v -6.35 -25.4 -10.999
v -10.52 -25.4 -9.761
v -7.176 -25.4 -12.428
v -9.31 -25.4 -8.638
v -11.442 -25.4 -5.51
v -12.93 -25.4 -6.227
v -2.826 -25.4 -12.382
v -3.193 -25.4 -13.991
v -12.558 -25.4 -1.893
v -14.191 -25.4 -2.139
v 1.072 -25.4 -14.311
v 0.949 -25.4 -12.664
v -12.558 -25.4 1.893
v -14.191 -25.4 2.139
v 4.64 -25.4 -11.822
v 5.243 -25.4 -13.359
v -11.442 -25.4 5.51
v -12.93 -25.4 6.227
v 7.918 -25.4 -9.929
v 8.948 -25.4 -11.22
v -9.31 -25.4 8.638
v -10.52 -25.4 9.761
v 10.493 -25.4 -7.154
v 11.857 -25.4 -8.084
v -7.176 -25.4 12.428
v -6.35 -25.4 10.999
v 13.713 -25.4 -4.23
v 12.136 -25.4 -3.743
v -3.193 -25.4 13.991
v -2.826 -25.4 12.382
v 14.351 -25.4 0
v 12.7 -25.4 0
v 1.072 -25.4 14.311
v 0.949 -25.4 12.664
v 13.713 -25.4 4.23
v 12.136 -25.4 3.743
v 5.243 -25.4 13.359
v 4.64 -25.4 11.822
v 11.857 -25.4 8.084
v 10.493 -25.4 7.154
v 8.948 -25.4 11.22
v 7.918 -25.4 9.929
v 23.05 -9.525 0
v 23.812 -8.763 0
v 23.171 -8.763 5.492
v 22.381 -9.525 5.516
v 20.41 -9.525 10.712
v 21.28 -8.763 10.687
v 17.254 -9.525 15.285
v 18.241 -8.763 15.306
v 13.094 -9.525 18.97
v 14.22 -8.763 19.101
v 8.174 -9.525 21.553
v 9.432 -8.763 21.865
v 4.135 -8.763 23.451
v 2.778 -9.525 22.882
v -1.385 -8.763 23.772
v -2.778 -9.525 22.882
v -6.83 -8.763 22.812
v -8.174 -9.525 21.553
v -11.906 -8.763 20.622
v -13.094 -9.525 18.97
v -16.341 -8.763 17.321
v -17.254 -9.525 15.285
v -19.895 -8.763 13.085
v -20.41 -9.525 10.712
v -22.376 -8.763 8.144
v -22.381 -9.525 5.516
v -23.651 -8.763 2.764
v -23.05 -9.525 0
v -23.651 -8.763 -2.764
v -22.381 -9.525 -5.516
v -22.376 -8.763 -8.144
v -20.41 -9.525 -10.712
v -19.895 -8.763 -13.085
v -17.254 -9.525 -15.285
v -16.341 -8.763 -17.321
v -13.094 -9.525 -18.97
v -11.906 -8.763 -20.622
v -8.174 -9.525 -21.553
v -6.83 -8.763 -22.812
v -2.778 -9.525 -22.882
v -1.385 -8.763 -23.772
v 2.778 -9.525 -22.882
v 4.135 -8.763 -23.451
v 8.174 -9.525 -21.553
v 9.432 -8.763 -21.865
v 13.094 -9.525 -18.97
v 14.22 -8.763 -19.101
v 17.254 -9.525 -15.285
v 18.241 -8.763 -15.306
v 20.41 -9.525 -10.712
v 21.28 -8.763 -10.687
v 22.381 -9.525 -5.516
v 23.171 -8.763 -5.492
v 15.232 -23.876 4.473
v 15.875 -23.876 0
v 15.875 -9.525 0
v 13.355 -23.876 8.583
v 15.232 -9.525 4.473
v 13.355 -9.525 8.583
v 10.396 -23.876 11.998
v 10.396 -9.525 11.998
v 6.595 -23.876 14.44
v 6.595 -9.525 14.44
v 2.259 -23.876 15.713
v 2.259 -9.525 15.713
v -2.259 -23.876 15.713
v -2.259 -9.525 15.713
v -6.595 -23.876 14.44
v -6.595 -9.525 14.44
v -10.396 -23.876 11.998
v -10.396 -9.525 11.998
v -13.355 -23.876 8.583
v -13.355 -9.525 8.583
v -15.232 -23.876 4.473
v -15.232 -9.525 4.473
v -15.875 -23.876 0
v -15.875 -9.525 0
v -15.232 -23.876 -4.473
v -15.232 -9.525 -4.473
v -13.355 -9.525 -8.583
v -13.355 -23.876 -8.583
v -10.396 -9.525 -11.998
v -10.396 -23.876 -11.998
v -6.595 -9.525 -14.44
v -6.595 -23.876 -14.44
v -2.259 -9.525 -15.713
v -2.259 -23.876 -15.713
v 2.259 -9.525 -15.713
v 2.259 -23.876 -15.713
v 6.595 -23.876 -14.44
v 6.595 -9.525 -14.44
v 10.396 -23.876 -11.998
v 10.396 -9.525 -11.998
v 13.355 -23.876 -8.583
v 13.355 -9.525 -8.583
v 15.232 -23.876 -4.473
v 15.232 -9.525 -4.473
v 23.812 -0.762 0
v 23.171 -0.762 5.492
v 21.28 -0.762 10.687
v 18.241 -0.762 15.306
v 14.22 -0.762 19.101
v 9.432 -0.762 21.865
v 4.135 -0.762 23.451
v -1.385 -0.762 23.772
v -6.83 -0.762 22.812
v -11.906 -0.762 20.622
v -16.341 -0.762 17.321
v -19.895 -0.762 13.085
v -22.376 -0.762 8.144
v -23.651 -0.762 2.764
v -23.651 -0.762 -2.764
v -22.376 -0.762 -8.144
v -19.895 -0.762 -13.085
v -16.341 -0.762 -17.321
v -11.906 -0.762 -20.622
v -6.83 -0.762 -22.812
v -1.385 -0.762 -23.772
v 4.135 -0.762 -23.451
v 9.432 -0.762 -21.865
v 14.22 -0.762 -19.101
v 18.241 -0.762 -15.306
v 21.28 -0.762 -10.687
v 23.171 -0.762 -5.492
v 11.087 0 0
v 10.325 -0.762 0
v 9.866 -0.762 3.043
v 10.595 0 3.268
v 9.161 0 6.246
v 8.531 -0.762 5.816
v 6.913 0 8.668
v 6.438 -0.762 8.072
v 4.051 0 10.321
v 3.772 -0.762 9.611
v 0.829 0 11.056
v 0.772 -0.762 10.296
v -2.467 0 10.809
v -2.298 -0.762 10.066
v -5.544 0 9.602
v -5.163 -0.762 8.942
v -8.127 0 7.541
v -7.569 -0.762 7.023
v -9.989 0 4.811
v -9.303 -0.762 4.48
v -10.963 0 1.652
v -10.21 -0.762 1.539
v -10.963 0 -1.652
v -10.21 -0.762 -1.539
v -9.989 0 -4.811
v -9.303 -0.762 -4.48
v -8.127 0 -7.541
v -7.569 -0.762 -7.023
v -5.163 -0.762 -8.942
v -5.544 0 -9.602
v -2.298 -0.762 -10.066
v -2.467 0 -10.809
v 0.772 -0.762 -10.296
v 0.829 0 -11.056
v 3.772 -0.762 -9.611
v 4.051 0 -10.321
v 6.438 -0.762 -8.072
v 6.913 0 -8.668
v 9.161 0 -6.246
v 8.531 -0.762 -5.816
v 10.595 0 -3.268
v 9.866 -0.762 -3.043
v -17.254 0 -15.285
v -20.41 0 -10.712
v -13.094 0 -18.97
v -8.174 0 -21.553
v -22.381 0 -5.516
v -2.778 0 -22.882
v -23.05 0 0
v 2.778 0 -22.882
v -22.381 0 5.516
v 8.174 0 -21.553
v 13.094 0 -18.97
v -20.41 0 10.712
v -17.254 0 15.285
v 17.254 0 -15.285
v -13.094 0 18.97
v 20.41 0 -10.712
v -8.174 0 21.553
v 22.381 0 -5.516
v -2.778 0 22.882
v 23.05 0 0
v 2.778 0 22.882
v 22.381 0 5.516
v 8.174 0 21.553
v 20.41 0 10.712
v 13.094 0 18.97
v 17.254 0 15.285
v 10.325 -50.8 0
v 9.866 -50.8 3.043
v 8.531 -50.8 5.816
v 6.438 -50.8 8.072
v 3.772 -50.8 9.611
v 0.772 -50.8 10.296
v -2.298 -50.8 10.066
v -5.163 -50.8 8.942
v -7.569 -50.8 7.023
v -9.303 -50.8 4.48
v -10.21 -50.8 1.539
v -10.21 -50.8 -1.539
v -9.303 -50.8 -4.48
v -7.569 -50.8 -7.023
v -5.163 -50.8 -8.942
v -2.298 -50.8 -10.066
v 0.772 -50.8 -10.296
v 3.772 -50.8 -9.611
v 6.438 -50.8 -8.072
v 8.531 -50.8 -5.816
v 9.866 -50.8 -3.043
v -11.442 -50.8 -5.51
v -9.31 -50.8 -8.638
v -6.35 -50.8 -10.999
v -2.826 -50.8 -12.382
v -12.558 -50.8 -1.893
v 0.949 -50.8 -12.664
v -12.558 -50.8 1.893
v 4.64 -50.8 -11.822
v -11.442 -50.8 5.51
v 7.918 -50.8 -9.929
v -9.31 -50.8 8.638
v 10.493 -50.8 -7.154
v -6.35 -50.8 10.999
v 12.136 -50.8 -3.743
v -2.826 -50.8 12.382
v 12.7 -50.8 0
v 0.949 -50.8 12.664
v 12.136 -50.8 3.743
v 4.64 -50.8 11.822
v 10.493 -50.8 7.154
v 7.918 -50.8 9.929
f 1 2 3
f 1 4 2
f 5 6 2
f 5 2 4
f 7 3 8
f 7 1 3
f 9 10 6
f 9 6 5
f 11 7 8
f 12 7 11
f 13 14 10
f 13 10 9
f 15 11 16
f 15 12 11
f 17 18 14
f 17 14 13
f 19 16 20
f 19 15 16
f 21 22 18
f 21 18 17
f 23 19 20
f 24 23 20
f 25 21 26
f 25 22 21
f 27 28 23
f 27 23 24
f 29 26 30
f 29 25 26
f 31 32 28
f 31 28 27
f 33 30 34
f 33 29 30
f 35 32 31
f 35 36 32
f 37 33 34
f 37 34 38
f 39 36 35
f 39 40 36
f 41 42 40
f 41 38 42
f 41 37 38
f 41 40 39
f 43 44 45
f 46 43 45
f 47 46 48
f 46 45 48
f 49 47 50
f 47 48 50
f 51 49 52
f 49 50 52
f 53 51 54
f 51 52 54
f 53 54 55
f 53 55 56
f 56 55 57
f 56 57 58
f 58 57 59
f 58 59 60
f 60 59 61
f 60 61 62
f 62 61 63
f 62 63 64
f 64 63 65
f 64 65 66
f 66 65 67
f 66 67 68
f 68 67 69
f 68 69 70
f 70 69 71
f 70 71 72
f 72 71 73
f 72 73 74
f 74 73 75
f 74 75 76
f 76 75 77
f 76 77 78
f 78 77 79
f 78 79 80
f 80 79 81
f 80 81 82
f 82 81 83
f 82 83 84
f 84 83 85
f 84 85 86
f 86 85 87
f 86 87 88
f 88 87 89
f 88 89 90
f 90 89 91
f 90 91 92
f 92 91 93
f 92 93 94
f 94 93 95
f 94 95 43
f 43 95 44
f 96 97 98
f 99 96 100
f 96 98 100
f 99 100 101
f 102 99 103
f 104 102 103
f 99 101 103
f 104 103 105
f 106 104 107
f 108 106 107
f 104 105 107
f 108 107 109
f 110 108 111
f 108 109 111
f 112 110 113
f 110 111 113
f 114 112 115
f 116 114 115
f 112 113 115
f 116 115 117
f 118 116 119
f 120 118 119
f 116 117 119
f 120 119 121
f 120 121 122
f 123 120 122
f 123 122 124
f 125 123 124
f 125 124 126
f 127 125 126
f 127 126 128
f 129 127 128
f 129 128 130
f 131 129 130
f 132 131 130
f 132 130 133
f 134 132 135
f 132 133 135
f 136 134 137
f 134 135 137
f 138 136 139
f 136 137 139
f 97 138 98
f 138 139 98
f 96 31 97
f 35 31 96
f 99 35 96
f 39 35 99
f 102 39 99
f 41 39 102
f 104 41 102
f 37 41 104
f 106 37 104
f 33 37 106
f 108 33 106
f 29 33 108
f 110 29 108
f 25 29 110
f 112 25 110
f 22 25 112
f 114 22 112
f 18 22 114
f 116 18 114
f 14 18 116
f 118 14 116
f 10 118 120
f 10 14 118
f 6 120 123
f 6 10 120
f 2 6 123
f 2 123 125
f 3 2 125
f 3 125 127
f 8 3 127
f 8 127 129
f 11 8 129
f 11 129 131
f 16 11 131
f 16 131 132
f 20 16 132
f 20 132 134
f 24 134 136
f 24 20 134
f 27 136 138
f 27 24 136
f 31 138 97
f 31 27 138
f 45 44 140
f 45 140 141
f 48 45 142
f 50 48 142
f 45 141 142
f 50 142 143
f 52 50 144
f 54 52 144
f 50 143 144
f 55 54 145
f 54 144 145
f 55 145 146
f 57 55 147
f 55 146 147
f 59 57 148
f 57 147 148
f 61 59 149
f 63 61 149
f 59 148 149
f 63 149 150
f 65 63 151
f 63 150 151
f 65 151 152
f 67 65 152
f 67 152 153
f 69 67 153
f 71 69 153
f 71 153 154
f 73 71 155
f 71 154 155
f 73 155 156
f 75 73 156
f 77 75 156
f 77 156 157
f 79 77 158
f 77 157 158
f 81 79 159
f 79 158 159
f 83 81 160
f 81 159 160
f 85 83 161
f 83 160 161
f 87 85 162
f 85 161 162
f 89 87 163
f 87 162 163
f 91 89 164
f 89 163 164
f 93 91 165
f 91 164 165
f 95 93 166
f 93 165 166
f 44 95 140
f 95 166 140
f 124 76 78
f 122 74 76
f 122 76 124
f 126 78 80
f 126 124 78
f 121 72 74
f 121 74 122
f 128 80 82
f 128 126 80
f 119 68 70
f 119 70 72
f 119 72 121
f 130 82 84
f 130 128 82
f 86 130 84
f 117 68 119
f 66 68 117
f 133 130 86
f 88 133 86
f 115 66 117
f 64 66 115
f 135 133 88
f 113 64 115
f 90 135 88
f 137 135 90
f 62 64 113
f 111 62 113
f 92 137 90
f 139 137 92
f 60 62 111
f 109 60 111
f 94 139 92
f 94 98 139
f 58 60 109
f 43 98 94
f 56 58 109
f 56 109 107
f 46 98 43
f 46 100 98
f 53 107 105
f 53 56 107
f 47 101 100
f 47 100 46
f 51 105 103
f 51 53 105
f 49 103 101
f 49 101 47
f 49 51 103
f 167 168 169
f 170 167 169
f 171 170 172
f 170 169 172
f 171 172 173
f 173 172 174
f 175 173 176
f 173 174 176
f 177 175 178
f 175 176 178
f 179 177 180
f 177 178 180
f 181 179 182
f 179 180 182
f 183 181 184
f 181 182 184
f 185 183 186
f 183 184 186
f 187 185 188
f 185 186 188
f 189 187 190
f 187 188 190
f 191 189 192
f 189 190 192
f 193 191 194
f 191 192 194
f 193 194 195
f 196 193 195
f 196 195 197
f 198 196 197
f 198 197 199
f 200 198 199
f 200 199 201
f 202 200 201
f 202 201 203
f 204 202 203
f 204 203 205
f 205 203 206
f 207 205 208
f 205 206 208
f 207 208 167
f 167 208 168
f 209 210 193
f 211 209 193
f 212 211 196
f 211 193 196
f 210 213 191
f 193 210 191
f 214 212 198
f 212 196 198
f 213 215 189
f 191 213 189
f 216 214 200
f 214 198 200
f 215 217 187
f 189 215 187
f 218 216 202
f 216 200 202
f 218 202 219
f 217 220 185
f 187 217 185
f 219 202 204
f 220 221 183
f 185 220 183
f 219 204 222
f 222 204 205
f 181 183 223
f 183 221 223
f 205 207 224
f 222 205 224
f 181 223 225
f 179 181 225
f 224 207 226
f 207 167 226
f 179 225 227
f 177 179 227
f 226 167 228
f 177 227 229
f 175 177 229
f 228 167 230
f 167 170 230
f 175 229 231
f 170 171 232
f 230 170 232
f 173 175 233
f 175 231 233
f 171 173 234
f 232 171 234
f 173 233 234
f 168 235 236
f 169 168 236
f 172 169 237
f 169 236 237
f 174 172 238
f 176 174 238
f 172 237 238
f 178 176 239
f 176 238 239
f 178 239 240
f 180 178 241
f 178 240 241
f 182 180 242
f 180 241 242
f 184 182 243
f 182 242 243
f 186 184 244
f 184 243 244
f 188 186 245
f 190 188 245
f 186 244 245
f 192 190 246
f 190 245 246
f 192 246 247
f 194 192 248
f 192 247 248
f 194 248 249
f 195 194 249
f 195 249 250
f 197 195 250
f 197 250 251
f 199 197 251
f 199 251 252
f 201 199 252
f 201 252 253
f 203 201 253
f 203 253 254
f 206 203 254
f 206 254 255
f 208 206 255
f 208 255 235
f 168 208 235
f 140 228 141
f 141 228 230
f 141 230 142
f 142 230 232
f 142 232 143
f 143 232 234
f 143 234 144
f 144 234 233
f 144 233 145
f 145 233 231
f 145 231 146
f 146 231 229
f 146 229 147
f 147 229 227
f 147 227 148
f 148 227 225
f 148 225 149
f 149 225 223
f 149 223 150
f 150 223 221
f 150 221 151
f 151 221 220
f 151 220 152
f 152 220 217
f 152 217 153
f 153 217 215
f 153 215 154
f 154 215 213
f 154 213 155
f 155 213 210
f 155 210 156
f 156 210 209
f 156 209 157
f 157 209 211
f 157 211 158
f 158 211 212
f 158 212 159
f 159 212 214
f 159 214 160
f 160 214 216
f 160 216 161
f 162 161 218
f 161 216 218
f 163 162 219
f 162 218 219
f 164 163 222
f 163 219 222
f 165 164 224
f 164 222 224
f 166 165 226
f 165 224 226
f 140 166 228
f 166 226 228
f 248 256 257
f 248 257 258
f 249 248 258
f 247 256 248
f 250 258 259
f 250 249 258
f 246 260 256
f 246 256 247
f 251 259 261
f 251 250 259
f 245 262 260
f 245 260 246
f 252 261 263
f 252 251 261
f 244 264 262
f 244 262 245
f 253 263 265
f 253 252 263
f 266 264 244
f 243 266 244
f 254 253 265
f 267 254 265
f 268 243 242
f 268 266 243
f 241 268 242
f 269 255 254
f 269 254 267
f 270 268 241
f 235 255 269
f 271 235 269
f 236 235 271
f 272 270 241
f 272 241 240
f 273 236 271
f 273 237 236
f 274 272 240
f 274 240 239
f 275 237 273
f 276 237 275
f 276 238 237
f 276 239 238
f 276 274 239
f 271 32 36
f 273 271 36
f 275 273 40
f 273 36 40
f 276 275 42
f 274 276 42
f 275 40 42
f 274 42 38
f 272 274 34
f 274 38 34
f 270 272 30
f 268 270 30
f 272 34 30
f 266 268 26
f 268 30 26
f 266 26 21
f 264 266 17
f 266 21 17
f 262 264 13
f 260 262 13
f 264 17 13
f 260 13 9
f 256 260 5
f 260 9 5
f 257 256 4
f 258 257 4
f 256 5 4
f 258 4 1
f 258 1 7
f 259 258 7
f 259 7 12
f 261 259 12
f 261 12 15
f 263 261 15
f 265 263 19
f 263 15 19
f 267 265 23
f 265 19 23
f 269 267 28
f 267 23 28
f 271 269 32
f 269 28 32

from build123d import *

# Parameters (mm, degrees)
F0_R     = 23.8125
F1_DEPTH = 9.525
F2_R     = 15.875
F3_DEPTH = 15.875
F4_R     = 12.7
F5_DEPTH = 25.4
F6_R     = 10.3251
F7_DEPTH = 50.801
F8_SIZE  = 1.524
F9_SIZE  = 0.762


with BuildPart() as f1:
    # F0 (on Front) → F1 (new body)
    with BuildSketch(Plane.XZ):
        Circle(F0_R)
    extrude(amount=F1_DEPTH)

    # F2 (on face) → F3 (join)
    with BuildSketch(Plane.XZ.offset(9.525)):
        Circle(F2_R)
    extrude(amount=F3_DEPTH)

    # F4 (on face) → F5 (join)
    with BuildSketch(Plane.XZ.offset(25.4)):
        Circle(F4_R)
    extrude(amount=F5_DEPTH)

    # F6 (on face) → F7 (cut, through all)
    with BuildSketch(Plane.XZ.offset(50.8)):
        Circle(F6_R)
    extrude(amount=-F7_DEPTH, mode=Mode.SUBTRACT)

    # F8
    f8_edges = [f1.edges().sort_by_distance(p)[0] for p in [
        (-15.875, -25.4, 0),
    ]]
    chamfer(f8_edges, length=F8_SIZE)

    # F9
    f9_edges = [f1.edges().sort_by_distance(p)[0] for p in [
        (-23.8125, -9.525, 0),
        (-23.8125, 0, 0),
        (-10.3251, 0, 0),
    ]]
    chamfer(f9_edges, length=F9_SIZE)


solid = f1.part
